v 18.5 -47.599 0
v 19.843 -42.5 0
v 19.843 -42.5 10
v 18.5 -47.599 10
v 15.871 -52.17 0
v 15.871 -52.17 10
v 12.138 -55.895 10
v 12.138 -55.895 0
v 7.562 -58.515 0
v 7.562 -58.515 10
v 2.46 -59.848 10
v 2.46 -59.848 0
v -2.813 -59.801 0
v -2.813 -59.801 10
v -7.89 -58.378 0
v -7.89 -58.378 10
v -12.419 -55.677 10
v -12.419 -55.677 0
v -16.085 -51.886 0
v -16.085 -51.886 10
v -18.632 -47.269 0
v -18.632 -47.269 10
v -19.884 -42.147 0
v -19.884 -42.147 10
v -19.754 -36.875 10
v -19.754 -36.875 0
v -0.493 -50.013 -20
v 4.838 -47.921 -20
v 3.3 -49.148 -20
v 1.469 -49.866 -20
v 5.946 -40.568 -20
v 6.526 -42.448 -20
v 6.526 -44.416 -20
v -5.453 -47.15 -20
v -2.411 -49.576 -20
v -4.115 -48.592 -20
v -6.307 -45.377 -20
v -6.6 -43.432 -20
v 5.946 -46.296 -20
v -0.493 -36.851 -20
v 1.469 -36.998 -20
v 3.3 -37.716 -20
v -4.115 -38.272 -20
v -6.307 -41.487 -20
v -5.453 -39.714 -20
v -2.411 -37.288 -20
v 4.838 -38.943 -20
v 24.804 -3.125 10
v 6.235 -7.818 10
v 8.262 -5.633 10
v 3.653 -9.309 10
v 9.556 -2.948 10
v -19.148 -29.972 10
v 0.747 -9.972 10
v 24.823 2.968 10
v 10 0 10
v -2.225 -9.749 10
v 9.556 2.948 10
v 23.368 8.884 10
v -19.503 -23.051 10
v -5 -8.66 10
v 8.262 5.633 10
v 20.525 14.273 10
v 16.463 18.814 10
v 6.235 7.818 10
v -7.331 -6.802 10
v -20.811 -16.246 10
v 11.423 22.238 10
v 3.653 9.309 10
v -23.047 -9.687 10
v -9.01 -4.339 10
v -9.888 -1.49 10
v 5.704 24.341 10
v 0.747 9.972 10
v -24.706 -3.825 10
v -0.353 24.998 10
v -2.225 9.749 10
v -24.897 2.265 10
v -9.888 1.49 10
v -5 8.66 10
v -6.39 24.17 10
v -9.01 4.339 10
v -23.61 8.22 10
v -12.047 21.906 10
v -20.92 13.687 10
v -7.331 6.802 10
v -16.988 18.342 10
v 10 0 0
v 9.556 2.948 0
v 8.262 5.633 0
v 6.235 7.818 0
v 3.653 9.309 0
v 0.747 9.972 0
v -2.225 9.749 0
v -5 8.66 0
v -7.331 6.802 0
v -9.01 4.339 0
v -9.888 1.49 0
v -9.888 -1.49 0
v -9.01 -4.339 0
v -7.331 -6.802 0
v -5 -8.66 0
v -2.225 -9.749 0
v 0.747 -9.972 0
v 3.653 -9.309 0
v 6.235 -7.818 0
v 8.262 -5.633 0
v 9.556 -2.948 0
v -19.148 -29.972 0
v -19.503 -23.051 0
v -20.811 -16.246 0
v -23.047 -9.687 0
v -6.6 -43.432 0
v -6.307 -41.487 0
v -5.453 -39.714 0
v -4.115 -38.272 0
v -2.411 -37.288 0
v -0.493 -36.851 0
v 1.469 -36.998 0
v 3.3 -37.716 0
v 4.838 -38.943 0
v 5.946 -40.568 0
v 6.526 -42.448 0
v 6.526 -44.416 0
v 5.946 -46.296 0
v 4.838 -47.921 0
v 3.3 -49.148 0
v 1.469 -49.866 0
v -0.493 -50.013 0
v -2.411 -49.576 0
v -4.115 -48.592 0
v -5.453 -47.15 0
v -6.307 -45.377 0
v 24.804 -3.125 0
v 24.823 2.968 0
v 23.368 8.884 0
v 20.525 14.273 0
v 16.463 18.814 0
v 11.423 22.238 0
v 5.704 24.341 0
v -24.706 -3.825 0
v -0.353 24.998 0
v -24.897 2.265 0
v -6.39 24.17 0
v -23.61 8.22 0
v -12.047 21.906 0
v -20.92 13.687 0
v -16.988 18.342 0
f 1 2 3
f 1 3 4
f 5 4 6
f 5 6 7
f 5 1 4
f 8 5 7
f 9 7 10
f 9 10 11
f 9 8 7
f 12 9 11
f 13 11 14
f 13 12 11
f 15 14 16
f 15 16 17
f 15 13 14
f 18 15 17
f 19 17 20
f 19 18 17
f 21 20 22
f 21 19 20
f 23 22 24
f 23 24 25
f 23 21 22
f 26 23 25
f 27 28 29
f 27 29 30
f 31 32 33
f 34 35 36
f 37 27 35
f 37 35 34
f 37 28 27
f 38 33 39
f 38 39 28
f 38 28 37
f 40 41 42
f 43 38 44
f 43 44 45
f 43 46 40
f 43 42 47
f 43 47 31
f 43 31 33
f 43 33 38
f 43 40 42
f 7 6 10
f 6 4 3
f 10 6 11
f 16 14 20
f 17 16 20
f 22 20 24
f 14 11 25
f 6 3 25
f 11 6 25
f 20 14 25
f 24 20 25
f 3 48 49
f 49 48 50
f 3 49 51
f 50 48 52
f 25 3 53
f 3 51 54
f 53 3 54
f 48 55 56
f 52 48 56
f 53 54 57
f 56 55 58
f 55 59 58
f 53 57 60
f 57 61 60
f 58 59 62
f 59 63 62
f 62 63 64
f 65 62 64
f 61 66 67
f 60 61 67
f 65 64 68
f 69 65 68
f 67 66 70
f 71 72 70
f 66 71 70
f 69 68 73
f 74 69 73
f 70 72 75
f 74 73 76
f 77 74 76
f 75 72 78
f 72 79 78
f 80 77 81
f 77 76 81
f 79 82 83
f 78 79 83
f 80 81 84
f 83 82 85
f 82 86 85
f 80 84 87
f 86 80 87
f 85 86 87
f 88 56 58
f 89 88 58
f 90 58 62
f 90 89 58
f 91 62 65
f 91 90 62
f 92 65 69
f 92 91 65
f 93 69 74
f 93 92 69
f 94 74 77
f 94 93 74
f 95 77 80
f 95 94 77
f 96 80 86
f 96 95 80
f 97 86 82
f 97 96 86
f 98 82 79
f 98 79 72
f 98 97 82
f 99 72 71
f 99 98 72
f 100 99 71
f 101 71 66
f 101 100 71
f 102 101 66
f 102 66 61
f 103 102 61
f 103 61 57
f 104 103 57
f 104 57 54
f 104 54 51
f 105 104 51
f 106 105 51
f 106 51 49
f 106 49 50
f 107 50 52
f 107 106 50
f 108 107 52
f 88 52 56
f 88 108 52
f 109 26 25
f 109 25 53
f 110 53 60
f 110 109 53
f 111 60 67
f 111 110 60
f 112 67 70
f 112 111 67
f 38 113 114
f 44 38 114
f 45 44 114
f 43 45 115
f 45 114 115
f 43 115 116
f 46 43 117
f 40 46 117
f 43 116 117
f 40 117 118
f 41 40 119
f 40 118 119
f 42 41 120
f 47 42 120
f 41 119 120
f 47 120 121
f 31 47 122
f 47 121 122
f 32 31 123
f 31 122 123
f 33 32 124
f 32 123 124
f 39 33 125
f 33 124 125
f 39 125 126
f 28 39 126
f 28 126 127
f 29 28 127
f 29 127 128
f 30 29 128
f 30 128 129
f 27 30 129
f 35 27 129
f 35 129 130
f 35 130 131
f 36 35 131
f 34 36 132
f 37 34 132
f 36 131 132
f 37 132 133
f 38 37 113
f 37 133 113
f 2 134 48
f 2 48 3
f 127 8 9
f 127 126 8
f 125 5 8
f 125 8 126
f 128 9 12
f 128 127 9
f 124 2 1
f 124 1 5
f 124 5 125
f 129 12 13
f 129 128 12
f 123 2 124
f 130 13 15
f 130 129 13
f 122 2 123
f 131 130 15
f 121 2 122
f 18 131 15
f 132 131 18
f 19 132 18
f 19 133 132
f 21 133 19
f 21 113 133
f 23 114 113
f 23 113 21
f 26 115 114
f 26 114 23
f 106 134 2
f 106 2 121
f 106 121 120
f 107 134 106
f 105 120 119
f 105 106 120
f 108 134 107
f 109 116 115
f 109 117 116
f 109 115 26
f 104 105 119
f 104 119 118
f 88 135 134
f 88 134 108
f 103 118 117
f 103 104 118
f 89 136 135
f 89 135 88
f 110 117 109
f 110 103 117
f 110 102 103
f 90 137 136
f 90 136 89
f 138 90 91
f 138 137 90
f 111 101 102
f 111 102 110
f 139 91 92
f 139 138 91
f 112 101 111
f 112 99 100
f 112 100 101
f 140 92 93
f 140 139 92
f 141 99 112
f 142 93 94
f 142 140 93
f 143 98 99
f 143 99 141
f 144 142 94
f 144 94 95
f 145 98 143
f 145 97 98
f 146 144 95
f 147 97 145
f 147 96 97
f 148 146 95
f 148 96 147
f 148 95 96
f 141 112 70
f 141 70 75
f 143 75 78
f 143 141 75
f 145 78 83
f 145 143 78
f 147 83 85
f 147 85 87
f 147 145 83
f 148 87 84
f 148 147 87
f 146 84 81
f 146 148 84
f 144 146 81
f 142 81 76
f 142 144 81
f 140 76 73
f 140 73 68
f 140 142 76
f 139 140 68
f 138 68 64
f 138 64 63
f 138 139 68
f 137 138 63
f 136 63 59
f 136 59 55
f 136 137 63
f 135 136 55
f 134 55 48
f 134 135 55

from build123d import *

# Parameters (mm, degrees)
SKETCH_1_R      = 10
EXTRUDE_1_DEPTH = 10
SKETCH_2_R      = 6.599829968
EXTRUDE_2_DEPTH = 20


with BuildPart() as part:
    # 草图1 → 凸台-拉伸1 (new body)
    with BuildSketch(Plane.XY):
        with BuildLine():
            Line((24.803918541, -3.125), (19.843134833, -42.5))
            ThreePointArc((19.843134833, -42.5), (-2.812850316, -59.80120888), (-19.754350787, -36.875))
            ThreePointArc((-19.754350787, -36.875), (-19.502870979, -23.051442481), (-23.046742584, -9.6875))
            ThreePointArc((-23.046742584, -9.6875), (-3.396839472, 24.768154586), (24.803918541, -3.125))
        make_face()
        Circle(SKETCH_1_R, mode=Mode.SUBTRACT)
    extrude(amount=EXTRUDE_1_DEPTH)

    # 草图2 → 凸台-拉伸2 (add)
    with BuildSketch(Plane(origin=(0, 0, 0), x_dir=(-1, 0, 0), z_dir=(0, 0, -1))):
        with Locations((0, -43.431952643)):
            Circle(SKETCH_2_R)
    extrude(amount=EXTRUDE_2_DEPTH)


solid = part.part
